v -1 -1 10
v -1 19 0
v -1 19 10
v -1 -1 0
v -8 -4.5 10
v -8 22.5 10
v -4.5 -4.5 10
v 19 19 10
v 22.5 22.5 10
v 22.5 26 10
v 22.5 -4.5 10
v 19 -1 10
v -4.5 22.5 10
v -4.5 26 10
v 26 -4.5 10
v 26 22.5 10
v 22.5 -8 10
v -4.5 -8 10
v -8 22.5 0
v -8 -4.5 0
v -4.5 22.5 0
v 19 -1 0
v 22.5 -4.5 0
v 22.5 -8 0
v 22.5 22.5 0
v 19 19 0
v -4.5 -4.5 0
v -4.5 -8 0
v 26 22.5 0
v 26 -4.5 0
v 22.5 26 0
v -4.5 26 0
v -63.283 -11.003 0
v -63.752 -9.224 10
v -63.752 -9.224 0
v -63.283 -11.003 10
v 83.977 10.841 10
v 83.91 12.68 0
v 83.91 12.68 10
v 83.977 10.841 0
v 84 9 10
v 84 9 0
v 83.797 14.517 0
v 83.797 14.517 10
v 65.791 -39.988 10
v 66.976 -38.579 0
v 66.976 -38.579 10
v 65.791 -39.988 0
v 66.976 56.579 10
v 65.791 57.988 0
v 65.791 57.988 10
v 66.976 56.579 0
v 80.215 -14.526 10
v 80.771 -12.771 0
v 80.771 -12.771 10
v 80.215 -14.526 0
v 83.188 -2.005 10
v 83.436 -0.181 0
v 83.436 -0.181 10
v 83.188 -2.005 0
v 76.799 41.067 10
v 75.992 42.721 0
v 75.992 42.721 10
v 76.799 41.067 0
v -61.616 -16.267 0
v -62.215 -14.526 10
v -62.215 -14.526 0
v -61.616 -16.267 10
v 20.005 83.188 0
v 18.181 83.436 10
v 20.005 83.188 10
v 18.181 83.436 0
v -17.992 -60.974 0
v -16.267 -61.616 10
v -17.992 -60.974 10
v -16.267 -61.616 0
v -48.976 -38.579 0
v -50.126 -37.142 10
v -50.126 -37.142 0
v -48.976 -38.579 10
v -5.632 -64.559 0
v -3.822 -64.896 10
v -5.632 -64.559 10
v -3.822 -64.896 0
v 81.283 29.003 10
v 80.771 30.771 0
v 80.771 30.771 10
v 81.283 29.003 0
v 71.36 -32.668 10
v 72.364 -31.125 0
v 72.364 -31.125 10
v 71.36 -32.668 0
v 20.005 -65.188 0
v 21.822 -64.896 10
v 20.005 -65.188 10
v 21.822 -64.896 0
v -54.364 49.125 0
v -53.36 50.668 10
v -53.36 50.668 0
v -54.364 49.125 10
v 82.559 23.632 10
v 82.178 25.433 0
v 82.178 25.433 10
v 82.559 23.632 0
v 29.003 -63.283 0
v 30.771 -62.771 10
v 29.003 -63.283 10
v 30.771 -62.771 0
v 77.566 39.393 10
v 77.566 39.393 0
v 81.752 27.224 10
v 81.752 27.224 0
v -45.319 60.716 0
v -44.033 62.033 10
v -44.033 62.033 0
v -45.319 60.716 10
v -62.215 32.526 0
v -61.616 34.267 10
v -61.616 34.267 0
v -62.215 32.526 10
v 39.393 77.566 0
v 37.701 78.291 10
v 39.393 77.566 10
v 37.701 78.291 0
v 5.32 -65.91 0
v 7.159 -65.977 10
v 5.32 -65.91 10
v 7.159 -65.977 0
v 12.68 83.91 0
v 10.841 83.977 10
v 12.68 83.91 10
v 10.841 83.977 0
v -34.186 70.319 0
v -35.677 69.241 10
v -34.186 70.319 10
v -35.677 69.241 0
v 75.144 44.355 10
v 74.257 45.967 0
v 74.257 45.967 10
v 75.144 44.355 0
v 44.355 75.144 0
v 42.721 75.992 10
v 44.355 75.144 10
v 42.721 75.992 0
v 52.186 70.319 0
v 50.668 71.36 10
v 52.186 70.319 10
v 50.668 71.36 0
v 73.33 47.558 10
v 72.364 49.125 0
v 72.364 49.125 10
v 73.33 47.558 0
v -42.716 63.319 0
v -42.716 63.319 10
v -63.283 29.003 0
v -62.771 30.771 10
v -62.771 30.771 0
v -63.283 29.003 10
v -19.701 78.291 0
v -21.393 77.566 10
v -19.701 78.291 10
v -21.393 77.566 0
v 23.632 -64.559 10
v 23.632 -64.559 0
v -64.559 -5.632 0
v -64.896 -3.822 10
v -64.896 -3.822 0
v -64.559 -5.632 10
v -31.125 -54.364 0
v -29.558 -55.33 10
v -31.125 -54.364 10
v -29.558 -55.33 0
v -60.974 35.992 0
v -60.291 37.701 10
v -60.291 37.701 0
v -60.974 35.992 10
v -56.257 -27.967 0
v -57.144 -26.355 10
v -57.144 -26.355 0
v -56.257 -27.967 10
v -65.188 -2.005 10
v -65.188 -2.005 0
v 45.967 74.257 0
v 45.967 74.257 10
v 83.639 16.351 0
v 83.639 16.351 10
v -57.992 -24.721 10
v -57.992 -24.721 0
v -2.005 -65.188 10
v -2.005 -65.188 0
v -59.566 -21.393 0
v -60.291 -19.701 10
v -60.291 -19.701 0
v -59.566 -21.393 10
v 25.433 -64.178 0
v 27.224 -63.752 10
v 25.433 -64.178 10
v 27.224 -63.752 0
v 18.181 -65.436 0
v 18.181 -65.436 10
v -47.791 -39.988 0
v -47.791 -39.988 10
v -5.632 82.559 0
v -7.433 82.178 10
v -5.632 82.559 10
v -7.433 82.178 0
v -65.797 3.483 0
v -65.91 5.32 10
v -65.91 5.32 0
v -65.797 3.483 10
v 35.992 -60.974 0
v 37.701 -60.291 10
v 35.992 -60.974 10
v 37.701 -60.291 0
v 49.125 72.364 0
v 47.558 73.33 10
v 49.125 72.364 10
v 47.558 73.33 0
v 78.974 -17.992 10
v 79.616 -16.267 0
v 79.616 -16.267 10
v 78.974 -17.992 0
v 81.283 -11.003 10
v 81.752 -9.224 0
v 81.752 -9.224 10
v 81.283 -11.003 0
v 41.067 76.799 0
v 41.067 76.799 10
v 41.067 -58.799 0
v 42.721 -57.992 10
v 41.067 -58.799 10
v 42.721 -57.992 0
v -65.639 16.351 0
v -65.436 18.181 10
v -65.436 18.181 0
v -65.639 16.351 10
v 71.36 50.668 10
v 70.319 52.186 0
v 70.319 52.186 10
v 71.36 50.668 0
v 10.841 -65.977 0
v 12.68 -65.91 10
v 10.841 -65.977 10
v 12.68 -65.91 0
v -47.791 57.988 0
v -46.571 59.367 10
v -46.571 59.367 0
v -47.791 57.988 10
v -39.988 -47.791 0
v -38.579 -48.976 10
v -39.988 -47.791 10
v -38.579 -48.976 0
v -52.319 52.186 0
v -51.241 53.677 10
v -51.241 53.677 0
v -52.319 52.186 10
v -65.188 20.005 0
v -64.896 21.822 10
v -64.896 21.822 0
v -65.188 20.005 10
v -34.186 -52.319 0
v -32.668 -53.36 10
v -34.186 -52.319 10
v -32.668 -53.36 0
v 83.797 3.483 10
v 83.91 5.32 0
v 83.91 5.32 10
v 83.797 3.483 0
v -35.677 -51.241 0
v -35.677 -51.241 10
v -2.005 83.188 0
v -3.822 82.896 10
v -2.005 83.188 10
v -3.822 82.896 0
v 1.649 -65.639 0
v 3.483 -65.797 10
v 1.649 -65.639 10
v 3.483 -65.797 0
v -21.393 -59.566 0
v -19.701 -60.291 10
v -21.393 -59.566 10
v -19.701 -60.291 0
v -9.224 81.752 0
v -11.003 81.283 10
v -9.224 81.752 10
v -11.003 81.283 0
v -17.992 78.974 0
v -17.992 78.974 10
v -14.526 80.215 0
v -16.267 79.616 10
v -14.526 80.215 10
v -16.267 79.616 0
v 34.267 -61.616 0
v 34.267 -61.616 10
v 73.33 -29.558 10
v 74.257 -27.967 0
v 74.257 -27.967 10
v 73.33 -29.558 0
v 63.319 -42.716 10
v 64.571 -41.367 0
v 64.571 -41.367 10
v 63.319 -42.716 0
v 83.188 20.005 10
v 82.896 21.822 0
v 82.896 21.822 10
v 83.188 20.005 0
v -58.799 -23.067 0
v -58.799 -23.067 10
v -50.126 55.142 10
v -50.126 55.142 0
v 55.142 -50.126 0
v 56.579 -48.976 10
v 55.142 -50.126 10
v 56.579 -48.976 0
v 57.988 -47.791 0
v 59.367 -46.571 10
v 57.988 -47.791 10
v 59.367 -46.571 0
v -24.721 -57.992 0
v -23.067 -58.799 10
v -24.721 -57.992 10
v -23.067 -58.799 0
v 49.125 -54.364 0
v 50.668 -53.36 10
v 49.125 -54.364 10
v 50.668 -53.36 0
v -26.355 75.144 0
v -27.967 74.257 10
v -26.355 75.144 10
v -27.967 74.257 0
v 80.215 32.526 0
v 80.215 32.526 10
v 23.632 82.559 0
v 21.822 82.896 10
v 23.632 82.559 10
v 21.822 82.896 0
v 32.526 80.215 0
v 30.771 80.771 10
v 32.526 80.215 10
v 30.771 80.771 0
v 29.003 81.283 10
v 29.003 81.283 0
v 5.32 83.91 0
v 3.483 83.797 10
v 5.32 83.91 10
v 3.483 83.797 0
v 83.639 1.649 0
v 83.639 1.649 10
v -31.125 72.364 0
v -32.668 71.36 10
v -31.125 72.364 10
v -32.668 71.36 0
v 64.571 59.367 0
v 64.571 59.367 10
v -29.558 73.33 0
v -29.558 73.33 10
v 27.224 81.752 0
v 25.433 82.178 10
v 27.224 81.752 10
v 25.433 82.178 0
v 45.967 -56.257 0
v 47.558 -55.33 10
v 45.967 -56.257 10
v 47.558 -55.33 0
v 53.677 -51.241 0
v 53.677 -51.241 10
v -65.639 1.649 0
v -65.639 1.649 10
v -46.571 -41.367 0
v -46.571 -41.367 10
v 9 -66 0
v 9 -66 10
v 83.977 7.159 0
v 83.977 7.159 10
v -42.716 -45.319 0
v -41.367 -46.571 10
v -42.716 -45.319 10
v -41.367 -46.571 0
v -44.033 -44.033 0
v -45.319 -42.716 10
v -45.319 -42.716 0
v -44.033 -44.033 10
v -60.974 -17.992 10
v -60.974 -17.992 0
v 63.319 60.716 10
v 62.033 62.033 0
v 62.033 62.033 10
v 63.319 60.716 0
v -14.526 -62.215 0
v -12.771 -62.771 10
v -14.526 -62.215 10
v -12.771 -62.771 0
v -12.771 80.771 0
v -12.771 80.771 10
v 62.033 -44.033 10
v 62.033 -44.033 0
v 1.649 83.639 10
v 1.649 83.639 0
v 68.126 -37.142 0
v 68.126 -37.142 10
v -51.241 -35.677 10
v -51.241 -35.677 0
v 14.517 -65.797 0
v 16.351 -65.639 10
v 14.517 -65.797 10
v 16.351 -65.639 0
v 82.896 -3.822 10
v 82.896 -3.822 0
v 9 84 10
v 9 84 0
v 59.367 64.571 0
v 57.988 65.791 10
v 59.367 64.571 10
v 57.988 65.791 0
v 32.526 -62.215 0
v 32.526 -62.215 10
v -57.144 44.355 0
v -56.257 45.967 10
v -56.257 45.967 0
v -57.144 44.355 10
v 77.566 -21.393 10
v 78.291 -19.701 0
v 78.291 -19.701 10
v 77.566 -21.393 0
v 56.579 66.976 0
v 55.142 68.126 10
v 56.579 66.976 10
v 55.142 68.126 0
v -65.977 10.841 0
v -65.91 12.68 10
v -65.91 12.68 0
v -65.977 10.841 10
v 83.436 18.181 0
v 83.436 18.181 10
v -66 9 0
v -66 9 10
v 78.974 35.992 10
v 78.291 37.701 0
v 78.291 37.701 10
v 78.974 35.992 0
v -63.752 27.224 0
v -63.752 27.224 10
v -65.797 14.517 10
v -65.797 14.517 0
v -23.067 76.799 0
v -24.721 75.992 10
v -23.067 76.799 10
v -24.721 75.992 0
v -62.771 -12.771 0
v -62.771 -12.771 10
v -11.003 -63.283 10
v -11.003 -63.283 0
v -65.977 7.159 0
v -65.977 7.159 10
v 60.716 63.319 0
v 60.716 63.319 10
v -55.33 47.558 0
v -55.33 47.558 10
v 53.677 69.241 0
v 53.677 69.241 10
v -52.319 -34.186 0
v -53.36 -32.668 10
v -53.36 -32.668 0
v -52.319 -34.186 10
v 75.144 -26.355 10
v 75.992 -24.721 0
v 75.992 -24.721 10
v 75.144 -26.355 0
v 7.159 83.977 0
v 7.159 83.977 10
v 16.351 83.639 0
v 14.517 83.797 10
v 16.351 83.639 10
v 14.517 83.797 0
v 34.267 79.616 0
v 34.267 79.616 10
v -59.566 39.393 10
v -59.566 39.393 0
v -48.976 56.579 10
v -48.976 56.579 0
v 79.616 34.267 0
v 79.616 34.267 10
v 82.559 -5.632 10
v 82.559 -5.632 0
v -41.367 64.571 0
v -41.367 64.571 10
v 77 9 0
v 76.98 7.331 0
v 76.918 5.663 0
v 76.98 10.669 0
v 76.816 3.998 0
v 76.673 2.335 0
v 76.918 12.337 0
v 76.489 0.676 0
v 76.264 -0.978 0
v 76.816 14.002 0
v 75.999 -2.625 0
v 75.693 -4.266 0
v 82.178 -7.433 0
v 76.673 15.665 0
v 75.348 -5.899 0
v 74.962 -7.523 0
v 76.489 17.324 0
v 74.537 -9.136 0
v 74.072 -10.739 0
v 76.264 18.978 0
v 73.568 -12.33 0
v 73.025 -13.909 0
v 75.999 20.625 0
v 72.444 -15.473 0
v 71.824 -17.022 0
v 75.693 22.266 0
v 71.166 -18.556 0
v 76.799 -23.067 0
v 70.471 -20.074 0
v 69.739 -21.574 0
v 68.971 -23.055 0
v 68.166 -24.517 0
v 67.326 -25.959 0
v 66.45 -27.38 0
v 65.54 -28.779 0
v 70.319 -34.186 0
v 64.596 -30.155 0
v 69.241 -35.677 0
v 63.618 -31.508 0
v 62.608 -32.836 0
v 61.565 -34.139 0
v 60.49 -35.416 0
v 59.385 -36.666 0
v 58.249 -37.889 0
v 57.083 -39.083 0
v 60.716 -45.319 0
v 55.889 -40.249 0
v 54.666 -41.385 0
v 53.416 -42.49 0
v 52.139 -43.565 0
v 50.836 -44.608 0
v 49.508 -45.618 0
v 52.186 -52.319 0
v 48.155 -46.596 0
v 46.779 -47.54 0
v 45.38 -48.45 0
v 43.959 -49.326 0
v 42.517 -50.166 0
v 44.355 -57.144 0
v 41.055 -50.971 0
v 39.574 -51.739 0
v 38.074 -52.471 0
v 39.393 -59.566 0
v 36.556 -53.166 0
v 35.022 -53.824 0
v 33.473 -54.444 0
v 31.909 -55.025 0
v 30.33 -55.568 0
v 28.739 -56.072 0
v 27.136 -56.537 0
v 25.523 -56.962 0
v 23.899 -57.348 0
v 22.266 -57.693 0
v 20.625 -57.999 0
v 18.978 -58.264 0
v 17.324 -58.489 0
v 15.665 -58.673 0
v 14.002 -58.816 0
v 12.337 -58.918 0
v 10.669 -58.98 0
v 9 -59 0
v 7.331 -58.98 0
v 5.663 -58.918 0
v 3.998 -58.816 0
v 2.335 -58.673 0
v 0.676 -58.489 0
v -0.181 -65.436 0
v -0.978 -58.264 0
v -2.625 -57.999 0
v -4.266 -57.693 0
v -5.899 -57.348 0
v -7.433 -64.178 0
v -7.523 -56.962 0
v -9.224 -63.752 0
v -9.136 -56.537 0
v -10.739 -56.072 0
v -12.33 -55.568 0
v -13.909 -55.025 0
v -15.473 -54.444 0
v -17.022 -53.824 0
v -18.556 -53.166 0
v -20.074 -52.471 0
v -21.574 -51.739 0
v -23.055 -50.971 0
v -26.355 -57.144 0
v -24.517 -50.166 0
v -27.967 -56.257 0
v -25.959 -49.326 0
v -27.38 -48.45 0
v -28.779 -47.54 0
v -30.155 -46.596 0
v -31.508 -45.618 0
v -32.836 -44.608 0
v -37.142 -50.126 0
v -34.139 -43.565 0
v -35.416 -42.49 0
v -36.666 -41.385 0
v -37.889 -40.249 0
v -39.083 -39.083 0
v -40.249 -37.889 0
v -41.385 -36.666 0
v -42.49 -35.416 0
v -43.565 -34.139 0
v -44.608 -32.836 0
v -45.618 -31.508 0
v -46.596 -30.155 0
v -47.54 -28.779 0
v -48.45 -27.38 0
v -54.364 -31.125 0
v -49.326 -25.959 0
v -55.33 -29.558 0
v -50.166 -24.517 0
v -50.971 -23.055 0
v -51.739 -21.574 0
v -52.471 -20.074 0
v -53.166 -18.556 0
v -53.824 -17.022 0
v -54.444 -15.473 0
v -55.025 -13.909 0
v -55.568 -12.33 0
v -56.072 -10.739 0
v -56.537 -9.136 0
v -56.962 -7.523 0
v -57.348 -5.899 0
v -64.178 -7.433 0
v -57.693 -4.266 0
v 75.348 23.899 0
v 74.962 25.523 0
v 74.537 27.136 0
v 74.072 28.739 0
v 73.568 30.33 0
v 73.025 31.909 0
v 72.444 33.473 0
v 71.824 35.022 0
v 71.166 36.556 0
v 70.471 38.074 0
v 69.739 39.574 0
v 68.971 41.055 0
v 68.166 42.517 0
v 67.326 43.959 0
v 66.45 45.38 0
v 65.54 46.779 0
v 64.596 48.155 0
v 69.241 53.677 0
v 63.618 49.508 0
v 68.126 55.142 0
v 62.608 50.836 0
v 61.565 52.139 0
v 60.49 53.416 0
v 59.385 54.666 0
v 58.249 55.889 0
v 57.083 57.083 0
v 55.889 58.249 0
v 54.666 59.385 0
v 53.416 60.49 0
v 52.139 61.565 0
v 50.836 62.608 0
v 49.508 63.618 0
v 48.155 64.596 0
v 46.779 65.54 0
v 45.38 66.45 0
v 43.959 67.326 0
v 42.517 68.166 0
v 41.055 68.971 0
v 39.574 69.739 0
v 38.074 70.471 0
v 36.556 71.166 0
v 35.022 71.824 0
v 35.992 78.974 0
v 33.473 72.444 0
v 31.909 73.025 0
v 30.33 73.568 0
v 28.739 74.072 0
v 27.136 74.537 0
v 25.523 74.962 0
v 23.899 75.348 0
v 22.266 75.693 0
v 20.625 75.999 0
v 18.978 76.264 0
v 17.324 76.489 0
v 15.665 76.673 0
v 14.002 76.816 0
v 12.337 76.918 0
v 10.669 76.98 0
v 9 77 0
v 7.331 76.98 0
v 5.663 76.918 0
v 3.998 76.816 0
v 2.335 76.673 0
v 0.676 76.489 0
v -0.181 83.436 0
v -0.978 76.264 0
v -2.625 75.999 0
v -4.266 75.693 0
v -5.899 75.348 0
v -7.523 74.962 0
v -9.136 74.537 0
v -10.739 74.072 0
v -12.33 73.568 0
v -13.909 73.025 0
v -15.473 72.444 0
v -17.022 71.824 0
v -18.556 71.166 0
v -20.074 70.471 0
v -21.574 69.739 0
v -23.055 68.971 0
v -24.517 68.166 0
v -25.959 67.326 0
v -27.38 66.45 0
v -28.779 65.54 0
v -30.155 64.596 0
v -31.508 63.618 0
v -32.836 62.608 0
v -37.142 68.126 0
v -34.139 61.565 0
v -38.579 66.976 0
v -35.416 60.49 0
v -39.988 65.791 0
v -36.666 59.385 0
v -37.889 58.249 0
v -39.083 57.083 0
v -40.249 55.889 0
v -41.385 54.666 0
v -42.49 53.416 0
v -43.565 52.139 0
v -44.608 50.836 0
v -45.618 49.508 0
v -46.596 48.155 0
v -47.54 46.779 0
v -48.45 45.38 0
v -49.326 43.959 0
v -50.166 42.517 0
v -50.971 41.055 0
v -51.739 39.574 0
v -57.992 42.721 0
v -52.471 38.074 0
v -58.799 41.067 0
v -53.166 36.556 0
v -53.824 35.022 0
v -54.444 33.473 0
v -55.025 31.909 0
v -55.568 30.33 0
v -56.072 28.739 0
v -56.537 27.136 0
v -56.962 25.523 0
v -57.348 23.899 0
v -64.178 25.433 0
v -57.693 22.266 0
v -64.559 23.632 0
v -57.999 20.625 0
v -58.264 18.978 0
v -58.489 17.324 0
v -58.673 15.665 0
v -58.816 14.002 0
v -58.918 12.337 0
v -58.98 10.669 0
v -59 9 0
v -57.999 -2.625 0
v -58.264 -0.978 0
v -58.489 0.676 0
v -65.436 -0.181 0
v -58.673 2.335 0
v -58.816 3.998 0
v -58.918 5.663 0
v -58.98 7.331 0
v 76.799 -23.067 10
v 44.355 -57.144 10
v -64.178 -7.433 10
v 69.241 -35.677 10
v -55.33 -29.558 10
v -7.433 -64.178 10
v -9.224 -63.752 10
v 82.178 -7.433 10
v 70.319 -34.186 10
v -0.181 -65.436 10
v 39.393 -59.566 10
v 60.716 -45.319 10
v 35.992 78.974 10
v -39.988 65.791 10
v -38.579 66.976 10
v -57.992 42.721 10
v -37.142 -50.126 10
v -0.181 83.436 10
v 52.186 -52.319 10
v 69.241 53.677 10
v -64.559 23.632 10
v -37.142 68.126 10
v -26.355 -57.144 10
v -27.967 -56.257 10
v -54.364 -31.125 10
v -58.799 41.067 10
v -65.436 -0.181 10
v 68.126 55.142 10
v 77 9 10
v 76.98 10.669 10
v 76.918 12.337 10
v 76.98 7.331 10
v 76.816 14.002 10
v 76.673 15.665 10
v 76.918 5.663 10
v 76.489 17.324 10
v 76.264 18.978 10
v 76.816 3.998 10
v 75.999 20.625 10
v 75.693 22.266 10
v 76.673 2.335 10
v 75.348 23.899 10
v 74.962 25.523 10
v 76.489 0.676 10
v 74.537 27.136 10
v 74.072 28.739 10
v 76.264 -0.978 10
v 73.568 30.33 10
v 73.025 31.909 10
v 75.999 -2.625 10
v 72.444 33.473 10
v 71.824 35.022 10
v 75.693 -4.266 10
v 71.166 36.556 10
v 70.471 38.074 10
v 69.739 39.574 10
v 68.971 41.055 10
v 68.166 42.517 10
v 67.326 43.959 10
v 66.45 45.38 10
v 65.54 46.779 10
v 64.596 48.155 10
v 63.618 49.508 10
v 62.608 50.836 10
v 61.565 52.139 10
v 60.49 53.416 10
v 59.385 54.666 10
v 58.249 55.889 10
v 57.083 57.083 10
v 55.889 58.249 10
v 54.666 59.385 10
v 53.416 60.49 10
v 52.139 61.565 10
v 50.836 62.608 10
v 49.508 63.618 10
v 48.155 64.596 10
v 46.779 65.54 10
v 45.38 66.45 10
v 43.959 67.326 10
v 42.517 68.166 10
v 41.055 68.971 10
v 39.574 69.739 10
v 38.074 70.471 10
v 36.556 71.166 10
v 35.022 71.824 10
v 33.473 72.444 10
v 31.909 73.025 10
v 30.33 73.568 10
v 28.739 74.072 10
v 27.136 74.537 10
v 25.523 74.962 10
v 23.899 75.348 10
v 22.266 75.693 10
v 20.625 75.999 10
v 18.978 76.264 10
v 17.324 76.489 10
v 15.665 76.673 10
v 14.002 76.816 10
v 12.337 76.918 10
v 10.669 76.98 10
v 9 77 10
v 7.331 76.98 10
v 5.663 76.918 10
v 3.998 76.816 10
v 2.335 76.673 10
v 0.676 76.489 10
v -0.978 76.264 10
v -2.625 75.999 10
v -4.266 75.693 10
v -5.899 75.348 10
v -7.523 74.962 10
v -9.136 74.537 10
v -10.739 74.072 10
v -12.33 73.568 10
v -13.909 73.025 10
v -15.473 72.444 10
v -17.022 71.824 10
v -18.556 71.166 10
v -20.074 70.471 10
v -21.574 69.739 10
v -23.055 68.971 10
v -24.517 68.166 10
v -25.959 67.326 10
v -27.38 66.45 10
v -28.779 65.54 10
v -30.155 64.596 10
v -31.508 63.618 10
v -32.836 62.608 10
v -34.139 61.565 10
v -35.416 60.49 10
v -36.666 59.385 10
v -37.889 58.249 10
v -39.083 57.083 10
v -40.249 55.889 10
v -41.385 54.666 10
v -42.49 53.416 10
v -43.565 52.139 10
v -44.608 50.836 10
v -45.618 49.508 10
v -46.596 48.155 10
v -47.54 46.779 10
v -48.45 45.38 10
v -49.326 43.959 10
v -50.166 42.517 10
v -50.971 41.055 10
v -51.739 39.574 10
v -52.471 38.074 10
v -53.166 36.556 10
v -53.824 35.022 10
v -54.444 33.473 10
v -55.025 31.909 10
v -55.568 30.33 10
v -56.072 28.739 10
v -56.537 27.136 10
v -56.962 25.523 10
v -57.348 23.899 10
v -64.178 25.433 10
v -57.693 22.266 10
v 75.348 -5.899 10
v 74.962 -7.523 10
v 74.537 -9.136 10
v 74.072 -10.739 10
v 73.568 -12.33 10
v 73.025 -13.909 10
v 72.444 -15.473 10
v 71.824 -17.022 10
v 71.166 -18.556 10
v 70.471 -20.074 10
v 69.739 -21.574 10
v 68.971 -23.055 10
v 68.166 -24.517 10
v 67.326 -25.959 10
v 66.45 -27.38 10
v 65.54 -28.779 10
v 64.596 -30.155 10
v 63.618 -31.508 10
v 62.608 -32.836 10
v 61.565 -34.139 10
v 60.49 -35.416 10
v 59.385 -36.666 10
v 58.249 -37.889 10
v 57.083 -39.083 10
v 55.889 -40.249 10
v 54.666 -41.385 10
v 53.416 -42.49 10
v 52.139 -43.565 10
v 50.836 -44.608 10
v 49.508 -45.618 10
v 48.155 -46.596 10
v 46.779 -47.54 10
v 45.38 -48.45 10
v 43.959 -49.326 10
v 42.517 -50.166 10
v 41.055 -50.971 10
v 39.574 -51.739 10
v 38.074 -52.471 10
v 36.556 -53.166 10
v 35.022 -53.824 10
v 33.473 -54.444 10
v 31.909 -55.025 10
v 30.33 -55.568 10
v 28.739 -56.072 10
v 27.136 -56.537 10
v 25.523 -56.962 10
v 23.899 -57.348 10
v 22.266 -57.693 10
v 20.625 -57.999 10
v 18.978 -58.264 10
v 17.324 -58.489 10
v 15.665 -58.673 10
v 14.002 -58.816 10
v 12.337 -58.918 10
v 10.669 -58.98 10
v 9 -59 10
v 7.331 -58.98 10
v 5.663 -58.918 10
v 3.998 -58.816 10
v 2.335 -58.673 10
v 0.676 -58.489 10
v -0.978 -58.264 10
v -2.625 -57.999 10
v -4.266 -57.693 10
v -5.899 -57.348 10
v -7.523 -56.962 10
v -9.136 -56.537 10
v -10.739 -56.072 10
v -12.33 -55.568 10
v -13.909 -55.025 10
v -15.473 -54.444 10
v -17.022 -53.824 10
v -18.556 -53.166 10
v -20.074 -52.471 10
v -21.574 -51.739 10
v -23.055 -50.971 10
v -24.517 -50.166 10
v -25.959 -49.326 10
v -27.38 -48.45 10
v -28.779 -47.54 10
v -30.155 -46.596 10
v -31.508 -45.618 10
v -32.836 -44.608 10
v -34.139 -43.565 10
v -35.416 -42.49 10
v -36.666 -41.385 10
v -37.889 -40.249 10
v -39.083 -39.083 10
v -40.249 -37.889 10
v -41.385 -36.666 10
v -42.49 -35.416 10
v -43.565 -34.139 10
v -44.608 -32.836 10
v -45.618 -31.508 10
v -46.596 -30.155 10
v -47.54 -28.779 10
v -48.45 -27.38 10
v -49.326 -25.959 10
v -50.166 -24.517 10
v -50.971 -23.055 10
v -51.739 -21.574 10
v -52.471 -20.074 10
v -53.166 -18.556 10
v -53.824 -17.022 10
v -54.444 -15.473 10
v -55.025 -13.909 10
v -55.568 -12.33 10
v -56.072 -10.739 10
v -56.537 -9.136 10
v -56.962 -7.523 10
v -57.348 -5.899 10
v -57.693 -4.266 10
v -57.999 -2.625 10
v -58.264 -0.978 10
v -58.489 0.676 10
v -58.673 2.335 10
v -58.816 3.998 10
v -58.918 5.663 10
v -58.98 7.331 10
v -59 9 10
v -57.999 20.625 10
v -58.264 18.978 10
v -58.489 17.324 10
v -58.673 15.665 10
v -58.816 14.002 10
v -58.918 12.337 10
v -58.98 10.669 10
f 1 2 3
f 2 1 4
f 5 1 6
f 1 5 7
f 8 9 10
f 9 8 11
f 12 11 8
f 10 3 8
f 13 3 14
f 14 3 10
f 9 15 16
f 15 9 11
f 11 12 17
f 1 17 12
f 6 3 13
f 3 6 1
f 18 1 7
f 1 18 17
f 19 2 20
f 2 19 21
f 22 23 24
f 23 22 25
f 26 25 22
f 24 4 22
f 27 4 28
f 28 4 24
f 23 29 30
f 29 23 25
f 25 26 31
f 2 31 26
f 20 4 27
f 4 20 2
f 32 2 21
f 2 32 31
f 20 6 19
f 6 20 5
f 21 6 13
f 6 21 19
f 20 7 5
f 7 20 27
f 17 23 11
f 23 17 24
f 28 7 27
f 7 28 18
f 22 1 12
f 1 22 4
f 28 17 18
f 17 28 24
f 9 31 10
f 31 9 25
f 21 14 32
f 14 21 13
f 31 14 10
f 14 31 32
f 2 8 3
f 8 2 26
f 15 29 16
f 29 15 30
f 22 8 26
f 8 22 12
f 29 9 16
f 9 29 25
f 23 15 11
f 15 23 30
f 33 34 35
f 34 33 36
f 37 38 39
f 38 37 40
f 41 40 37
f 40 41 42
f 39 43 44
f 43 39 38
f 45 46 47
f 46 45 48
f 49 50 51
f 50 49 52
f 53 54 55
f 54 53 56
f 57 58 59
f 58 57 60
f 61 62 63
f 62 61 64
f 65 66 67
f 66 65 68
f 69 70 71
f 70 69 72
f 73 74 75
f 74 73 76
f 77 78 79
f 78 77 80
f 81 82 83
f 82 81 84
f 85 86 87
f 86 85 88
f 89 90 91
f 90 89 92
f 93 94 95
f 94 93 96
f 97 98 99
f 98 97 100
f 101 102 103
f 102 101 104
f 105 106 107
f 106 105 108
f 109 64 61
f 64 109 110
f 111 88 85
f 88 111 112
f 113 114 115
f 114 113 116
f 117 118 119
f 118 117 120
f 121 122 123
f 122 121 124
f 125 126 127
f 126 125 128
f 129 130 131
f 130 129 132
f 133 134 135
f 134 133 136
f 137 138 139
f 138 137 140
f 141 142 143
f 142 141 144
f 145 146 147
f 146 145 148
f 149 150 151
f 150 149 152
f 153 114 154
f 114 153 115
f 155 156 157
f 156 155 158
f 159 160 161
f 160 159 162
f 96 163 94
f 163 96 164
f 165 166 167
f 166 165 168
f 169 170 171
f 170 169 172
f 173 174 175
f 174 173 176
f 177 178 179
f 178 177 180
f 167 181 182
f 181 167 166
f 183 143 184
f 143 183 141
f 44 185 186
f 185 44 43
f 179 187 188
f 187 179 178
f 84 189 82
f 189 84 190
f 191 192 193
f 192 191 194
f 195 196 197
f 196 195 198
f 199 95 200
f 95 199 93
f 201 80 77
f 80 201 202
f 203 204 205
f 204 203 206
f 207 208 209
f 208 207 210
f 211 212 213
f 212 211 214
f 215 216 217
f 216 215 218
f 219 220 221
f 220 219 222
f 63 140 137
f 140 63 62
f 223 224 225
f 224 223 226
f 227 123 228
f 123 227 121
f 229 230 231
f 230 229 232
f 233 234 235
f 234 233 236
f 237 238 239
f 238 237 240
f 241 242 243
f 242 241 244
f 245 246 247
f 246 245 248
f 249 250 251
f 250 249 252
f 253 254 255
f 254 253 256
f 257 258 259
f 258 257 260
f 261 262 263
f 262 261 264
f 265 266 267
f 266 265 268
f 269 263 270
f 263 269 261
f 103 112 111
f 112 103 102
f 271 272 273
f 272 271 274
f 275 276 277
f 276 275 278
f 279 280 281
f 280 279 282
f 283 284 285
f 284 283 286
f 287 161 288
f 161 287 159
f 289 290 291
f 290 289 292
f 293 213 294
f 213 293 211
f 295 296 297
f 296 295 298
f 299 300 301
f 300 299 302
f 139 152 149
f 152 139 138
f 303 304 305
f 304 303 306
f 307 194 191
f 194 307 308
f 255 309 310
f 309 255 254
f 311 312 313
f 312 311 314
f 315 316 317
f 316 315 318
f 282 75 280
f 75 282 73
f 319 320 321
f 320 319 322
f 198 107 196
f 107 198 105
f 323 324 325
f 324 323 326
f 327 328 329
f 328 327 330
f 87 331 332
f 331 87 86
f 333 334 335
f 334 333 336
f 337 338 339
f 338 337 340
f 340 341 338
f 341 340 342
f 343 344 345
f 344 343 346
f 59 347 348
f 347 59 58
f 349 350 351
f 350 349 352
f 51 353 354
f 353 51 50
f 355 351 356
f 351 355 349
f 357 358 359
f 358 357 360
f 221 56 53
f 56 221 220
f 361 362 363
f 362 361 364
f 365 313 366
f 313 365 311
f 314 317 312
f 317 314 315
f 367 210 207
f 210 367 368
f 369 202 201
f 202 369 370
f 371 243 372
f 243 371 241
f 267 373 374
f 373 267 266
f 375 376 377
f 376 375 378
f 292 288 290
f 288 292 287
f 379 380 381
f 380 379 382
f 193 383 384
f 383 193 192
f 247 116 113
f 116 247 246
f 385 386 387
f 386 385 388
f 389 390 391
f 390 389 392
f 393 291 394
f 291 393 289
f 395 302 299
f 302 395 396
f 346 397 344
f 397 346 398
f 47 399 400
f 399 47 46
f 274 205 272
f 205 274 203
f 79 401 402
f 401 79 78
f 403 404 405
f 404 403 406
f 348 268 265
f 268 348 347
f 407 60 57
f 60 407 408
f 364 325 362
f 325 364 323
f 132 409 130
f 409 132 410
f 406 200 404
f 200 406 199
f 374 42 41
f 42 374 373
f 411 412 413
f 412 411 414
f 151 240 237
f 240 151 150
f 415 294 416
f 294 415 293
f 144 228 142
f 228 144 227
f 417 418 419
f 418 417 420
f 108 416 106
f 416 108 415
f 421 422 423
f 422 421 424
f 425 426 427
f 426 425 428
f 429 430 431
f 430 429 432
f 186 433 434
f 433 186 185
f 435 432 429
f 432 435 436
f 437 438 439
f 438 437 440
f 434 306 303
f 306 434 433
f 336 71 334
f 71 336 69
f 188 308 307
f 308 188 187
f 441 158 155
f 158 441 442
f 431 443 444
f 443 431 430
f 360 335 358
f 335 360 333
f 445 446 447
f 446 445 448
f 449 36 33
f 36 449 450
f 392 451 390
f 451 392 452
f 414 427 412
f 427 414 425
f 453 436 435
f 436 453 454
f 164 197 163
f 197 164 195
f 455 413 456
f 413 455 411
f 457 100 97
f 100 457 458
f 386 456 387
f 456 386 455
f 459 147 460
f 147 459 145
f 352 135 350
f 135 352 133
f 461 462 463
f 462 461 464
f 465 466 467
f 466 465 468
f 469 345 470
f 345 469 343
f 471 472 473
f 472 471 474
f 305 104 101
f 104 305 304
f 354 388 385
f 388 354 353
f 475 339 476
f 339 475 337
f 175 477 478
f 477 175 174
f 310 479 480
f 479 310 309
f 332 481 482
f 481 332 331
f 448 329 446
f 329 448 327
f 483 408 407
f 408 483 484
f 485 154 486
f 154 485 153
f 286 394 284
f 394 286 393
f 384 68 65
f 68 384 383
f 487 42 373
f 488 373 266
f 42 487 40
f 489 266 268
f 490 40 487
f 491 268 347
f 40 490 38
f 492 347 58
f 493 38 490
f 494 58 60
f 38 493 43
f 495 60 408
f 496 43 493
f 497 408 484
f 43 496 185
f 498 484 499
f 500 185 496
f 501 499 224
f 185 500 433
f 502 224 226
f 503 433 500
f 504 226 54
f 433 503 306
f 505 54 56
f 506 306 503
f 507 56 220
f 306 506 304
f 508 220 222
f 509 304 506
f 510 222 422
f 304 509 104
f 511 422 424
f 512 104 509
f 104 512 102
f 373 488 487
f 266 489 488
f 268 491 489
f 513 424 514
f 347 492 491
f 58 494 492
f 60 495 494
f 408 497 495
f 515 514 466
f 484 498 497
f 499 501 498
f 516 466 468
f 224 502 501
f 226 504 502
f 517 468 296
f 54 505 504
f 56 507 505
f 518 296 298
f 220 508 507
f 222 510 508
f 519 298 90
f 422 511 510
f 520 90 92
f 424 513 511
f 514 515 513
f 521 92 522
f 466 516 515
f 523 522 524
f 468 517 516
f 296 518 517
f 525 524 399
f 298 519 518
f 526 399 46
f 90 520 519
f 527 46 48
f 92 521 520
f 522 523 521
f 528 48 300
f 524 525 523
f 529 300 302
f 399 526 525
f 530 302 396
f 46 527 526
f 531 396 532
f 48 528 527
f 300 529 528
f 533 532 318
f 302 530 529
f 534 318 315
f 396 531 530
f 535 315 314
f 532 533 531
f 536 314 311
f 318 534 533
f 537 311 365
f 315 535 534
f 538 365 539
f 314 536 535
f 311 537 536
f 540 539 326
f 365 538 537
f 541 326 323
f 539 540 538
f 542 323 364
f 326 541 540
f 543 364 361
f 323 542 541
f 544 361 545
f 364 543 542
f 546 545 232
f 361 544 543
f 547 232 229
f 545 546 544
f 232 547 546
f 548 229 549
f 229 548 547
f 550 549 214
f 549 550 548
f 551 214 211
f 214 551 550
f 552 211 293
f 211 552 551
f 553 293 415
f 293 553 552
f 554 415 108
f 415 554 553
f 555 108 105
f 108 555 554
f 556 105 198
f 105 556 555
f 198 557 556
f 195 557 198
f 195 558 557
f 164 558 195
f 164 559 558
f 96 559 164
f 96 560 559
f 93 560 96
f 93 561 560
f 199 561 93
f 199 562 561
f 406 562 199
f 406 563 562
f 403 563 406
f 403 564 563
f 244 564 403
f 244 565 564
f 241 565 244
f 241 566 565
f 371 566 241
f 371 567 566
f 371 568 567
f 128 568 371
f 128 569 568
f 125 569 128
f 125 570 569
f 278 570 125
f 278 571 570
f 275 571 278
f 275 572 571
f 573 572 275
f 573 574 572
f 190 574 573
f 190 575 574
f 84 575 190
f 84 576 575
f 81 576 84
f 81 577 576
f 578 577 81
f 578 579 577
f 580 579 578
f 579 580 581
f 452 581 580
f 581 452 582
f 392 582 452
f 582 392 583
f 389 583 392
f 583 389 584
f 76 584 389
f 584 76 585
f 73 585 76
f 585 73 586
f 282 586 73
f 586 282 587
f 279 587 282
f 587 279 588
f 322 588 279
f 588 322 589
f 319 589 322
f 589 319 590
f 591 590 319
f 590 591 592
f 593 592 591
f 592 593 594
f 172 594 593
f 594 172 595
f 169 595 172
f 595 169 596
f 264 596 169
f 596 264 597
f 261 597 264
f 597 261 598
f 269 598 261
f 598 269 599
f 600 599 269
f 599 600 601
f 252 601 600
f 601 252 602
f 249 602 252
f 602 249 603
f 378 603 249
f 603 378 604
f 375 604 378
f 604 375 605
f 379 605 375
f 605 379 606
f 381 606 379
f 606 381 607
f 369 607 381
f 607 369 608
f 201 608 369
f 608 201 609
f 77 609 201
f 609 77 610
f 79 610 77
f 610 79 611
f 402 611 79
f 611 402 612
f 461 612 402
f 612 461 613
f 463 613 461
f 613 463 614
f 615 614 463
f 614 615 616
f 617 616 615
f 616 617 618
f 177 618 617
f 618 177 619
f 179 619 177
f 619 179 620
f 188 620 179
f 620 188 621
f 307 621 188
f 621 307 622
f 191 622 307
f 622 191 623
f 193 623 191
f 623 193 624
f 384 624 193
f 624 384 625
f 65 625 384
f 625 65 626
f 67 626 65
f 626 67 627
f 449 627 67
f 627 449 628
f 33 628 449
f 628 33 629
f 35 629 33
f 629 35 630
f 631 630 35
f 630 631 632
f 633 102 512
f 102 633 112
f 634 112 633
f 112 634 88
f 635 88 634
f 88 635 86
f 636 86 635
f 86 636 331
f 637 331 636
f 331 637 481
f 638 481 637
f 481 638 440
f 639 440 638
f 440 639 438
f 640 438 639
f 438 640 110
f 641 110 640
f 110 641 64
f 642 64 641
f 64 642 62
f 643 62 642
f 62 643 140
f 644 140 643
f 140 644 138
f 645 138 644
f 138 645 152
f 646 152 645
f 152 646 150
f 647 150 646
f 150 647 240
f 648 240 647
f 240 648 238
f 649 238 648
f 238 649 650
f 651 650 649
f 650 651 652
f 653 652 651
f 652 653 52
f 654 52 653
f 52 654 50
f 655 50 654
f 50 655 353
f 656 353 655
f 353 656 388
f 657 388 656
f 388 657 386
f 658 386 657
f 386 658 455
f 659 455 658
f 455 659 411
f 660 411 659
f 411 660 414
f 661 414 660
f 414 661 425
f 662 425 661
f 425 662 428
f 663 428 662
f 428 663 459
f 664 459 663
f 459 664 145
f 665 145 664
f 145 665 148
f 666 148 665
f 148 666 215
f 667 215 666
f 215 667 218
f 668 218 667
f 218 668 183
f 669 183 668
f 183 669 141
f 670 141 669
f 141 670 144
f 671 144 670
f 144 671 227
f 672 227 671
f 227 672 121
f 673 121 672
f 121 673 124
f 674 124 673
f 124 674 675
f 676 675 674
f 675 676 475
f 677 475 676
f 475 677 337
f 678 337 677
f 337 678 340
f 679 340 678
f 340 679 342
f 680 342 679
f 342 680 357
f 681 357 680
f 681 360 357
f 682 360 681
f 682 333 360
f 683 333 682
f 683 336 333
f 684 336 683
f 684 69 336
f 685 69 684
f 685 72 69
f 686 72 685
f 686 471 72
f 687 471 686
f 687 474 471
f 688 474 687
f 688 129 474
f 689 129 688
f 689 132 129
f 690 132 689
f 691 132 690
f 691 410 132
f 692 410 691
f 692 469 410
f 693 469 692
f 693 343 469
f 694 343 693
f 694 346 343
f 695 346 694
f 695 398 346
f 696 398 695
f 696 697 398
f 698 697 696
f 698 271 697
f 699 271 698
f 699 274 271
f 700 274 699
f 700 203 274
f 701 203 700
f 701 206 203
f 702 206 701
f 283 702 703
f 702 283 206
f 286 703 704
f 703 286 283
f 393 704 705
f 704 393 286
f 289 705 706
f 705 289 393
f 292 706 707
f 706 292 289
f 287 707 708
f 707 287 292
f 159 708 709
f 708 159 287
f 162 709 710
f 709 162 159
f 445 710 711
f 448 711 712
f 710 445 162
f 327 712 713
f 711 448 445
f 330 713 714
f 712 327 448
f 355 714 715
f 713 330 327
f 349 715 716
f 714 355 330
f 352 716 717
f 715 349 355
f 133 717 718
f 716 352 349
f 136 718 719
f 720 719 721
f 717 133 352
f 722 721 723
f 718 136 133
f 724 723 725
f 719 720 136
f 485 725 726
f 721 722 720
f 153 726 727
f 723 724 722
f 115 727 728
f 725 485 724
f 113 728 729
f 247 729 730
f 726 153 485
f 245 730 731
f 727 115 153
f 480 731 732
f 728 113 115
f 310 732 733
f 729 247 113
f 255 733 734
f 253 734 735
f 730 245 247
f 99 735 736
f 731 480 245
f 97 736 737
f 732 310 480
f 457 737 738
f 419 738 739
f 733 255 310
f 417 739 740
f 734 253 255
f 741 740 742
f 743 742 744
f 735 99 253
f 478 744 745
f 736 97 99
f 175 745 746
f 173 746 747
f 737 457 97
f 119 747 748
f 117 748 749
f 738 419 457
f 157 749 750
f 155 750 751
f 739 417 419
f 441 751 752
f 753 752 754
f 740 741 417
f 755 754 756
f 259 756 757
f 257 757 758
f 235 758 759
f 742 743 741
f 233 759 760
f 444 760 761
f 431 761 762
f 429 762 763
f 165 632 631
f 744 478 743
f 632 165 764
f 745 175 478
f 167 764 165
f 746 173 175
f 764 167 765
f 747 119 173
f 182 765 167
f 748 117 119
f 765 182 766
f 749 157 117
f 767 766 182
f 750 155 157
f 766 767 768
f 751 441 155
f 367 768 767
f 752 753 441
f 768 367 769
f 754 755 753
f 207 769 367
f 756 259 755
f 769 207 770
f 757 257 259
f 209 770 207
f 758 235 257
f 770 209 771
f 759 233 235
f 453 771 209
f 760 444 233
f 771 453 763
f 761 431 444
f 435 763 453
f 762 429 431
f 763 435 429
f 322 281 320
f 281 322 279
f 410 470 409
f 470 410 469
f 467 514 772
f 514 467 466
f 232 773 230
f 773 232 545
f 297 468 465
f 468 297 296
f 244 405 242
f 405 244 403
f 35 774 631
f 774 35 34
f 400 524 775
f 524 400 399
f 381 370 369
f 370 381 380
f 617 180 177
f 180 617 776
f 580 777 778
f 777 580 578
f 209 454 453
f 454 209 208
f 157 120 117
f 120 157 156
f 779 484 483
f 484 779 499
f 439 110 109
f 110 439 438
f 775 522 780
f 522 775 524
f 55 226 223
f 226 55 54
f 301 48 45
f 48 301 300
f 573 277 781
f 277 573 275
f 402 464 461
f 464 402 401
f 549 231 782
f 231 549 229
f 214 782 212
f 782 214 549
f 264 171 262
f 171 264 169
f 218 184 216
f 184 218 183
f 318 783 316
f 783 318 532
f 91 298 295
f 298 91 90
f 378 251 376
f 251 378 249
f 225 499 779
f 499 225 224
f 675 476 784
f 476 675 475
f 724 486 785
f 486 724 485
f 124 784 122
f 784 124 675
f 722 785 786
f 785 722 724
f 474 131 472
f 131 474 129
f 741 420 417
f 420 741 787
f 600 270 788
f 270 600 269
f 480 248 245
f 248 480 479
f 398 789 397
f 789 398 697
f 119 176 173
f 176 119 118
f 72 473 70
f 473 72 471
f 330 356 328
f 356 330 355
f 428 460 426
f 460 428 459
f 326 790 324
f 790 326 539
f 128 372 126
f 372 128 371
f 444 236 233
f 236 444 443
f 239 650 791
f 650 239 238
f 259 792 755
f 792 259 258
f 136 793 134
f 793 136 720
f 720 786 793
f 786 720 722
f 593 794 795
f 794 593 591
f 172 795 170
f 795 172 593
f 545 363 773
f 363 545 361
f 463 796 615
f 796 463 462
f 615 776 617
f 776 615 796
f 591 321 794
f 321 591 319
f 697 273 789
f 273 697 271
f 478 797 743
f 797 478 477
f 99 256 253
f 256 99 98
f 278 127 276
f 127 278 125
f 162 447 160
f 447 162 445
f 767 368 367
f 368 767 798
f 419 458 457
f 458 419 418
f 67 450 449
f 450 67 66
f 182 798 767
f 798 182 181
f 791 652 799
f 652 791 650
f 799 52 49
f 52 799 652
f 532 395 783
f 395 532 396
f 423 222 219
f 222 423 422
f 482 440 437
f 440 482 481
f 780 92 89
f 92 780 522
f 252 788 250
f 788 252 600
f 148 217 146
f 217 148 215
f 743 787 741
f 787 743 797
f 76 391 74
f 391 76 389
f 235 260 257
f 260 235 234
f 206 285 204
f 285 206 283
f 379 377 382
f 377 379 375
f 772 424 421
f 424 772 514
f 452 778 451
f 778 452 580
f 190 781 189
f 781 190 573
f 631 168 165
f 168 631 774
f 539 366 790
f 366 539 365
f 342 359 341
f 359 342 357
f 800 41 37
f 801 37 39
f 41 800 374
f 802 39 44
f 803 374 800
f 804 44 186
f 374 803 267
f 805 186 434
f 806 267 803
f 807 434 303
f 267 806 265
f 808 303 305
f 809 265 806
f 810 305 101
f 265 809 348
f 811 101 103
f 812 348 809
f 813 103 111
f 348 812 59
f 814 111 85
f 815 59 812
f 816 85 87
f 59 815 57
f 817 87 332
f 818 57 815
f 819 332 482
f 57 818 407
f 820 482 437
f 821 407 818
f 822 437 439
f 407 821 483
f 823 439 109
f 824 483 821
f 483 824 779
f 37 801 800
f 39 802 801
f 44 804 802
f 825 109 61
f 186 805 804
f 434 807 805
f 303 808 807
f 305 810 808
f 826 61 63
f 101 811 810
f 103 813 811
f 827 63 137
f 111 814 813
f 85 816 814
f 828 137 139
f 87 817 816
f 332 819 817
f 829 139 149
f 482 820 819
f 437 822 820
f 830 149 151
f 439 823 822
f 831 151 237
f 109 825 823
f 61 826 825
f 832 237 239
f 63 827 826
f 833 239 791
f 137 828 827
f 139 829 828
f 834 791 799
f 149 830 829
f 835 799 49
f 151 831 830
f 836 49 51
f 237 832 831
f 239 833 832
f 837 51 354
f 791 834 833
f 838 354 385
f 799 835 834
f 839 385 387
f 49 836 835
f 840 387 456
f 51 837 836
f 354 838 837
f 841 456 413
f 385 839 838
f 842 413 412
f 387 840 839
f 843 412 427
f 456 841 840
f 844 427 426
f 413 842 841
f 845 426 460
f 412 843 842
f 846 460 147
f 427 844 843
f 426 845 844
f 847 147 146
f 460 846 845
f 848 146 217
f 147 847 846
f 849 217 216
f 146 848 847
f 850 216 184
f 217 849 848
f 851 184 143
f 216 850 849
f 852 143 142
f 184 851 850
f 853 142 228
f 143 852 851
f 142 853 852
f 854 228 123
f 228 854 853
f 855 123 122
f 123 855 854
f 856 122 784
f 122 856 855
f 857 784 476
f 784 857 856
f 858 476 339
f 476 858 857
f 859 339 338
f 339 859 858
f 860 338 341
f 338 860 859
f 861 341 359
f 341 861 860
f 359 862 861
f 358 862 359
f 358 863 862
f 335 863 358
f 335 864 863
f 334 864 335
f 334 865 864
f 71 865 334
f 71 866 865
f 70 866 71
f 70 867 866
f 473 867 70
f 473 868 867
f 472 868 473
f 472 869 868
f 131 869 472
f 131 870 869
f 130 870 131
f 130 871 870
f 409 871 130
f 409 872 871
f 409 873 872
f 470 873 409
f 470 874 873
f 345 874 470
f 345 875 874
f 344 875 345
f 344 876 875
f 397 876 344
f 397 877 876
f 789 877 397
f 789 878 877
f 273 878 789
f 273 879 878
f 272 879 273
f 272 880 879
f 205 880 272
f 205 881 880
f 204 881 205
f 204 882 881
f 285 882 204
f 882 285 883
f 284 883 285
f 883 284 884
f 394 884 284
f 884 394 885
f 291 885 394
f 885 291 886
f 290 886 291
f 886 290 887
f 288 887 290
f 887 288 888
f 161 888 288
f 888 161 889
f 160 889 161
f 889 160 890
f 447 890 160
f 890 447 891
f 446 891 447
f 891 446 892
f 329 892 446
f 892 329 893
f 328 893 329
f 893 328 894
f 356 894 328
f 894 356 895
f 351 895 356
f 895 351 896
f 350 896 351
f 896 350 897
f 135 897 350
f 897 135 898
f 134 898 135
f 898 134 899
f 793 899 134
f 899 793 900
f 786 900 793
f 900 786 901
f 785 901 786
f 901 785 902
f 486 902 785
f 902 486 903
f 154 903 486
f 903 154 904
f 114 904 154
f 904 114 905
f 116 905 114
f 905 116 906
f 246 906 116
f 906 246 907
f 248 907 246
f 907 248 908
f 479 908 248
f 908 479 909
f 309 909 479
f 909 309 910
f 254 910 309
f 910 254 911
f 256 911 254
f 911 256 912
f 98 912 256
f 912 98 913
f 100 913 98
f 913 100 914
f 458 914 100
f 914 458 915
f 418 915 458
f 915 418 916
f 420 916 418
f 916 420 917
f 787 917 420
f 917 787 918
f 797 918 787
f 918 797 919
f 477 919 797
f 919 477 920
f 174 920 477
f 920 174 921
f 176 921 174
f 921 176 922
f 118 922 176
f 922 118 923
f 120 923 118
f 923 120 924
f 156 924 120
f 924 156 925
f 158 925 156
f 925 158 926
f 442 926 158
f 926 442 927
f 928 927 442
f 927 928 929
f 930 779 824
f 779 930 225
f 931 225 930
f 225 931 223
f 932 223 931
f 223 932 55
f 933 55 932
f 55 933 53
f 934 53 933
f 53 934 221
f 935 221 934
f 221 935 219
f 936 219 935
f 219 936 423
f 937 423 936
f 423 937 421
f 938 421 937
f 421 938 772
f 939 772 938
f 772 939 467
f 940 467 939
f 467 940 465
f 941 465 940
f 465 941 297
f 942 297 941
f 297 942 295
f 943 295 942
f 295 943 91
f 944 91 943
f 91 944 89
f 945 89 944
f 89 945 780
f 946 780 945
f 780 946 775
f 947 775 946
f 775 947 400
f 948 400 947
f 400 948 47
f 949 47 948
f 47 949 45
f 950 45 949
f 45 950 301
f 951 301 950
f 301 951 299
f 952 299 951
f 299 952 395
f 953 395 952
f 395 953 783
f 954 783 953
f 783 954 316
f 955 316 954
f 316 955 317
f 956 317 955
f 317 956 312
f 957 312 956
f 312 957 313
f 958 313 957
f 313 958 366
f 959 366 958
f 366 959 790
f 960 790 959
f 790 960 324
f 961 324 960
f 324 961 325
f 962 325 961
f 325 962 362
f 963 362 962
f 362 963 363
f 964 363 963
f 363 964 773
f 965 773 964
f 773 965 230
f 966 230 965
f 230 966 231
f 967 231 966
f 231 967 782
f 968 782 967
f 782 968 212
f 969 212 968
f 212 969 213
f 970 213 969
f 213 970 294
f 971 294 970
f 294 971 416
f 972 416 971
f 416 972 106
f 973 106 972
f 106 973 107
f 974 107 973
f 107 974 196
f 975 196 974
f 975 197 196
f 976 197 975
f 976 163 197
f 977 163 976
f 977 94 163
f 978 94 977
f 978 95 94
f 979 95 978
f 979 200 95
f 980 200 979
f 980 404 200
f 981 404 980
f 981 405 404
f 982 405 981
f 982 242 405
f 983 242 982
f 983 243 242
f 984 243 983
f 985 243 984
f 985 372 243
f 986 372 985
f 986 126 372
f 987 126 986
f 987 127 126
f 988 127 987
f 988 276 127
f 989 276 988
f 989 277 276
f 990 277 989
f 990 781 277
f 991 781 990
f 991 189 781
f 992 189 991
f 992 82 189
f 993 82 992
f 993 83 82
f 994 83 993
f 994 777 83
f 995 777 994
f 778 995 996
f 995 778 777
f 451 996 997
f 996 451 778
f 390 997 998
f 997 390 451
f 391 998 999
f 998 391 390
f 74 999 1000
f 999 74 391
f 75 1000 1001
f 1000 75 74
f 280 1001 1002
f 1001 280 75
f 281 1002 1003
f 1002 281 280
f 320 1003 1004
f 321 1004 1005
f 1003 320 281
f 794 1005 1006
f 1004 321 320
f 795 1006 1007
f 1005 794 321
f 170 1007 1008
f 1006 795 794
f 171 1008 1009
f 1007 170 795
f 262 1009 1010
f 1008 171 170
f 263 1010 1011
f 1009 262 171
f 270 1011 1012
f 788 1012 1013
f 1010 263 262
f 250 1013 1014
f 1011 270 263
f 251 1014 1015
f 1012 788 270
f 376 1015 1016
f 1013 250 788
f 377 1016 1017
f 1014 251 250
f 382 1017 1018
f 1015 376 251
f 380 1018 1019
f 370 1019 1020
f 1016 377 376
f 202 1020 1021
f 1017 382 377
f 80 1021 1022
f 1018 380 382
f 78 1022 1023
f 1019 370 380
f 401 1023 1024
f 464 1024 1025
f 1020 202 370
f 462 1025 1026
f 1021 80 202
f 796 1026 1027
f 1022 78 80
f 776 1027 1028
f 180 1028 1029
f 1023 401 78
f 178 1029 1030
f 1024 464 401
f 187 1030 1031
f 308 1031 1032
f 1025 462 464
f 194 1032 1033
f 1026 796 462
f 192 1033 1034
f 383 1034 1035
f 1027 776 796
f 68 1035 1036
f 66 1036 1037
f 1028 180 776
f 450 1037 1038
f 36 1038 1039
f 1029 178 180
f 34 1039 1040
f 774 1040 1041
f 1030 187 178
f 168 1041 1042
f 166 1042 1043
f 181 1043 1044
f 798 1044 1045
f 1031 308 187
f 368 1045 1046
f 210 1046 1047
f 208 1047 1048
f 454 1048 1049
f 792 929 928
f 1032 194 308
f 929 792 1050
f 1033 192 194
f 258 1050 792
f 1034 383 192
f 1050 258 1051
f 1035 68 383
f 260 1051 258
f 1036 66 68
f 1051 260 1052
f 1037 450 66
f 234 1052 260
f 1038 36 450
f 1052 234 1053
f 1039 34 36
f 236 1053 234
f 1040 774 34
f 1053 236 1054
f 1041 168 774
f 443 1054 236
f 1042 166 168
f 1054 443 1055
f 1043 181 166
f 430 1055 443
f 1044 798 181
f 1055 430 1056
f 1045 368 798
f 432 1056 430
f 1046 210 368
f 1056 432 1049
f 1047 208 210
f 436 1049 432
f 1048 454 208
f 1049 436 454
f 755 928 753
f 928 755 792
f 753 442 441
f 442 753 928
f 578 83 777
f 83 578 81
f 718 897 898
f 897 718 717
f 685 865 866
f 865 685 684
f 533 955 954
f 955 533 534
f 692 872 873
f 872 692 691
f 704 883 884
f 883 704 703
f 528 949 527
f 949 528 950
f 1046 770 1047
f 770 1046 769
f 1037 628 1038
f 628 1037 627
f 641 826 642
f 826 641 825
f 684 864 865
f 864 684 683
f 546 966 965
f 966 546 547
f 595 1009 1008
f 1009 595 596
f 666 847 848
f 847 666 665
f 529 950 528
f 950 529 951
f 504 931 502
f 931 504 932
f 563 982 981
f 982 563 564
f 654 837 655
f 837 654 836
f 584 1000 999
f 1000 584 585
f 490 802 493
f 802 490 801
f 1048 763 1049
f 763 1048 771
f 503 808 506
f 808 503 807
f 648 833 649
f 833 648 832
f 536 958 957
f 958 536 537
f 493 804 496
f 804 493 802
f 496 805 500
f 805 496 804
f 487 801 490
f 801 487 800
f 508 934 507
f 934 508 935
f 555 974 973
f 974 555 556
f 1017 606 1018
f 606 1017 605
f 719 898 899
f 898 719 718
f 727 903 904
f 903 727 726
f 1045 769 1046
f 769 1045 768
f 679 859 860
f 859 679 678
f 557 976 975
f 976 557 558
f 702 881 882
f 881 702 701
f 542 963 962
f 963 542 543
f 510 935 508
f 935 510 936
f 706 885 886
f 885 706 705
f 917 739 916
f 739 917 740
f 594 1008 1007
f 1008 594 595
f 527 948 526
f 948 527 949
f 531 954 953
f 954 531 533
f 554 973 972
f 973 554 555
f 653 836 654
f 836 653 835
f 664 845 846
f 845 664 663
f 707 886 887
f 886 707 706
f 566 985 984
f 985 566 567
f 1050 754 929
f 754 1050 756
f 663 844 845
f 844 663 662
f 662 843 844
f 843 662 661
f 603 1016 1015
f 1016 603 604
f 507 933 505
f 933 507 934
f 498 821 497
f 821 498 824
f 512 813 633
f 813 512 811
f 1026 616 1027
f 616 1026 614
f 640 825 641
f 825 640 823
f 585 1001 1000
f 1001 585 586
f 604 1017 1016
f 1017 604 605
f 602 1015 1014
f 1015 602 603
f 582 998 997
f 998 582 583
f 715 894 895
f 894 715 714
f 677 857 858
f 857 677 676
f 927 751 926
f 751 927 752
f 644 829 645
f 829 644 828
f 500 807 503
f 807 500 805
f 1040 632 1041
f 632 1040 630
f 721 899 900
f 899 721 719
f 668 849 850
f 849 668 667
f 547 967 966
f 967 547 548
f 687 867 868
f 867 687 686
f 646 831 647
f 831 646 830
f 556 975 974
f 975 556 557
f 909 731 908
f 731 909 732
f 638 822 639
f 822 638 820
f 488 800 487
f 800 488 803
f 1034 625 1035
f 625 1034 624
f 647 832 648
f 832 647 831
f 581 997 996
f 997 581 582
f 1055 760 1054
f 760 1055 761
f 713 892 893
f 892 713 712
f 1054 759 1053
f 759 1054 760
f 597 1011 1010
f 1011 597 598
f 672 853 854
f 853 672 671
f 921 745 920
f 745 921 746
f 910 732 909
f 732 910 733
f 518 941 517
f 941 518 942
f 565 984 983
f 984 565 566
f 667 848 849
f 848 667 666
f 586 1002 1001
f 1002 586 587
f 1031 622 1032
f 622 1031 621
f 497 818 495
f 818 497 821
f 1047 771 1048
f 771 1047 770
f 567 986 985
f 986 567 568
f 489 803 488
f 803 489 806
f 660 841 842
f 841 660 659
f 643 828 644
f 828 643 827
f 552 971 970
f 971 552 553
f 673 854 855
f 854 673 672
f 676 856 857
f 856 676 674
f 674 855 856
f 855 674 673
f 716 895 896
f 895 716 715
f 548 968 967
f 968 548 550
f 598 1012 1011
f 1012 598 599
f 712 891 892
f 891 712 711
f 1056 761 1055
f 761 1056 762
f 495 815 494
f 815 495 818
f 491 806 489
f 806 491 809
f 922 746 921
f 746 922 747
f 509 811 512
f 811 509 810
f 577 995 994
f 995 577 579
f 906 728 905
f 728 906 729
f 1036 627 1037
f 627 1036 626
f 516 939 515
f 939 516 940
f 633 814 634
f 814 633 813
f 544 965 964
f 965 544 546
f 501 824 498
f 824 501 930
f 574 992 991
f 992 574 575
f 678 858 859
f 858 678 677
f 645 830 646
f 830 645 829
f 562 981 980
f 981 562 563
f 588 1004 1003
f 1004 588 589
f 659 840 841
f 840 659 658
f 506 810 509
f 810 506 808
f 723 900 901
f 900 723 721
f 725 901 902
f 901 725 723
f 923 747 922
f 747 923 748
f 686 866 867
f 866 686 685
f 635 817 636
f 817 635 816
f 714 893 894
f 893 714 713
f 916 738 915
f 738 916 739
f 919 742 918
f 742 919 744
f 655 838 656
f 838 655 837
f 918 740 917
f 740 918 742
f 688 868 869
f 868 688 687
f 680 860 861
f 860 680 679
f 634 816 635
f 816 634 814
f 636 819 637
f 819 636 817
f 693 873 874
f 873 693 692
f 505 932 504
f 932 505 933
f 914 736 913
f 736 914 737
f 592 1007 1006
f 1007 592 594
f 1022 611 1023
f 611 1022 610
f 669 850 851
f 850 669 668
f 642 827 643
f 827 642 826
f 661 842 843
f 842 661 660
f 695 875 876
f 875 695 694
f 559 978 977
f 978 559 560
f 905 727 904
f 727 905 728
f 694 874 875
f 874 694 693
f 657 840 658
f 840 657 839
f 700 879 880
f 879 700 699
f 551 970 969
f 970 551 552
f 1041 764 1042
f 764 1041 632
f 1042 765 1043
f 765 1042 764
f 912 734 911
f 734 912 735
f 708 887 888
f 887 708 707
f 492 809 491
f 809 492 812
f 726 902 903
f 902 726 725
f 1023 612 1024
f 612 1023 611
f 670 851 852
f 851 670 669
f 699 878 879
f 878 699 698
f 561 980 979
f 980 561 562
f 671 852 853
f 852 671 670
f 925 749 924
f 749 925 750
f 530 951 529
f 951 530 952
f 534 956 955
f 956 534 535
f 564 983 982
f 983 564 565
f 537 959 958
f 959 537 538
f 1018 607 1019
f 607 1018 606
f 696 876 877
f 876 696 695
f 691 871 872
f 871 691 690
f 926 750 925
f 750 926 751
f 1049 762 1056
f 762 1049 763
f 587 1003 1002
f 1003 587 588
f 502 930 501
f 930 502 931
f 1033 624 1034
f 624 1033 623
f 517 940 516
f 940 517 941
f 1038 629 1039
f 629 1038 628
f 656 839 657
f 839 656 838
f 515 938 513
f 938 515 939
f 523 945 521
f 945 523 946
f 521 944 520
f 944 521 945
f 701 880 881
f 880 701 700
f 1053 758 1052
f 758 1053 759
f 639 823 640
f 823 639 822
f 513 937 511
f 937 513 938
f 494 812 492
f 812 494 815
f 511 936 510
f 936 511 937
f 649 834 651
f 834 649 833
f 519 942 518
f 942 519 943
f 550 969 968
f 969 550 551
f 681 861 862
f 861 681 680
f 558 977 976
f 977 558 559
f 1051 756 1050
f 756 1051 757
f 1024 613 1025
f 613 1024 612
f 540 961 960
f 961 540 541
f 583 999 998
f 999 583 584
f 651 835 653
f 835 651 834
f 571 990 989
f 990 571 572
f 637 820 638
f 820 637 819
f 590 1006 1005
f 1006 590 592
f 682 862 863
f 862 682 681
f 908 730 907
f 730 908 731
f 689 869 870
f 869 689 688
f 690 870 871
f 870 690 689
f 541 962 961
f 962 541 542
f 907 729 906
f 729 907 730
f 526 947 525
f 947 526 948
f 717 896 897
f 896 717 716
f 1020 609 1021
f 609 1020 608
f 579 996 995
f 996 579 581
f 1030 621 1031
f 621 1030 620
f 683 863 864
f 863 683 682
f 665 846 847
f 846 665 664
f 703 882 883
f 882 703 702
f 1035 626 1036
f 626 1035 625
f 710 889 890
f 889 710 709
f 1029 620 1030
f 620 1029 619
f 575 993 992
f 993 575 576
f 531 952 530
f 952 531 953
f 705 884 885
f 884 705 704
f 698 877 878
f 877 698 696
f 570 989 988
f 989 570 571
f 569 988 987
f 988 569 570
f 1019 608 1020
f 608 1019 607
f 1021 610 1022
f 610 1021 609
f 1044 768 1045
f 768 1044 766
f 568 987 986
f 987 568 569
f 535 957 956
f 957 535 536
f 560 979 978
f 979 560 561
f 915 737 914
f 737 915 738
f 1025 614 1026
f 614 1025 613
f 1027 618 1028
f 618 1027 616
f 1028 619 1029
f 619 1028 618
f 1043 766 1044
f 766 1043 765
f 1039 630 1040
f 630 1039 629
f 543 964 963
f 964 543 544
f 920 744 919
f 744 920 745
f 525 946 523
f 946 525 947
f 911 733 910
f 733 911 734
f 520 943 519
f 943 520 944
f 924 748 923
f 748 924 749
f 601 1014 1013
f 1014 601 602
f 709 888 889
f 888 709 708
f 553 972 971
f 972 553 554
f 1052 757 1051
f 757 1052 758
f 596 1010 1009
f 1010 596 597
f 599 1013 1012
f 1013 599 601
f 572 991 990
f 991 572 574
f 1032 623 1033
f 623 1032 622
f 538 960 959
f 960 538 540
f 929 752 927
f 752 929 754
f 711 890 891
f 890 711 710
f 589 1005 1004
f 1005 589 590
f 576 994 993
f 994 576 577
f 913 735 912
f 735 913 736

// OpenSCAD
// Generated by SolidPython 1.1.3 on 2026-06-23 12:55:20


union() {
	union() {
		translate(v = [-4.5000000000, 9.0000000000, 5.0000000000]) {
			cube(center = true, size = [7, 27, 10]);
		}
		translate(v = [9.0000000000, -4.5000000000, 5.0000000000]) {
			cube(center = true, size = [27, 7, 10]);
		}
		translate(v = [0, 27]) {
			translate(v = [9.0000000000, -4.5000000000, 5.0000000000]) {
				cube(center = true, size = [27, 7, 10]);
			}
		}
		translate(v = [27, 0]) {
			translate(v = [-4.5000000000, 9.0000000000, 5.0000000000]) {
				cube(center = true, size = [7, 27, 10]);
			}
		}
	}
	translate(v = [9.0000000000, 9.0000000000]) {
		difference() {
			cylinder($fn = 256, h = 10, r = 75.0000000000);
			cylinder($fn = 256, h = 10, r = 68.0000000000);
		}
	}
}
/***********************************************
*********      SolidPython code:      **********
************************************************

"""SCAD file export functions.

This module provides functions for exporting OpenSCAD geometries to .scad files.
"""

from typing import Dict, Optional
from pathlib import Path
import solid

from .config import ExportConfiguration, FileNamingConfig


def export_scad(
    geometry: solid.OpenSCADObject, output_path: Path, header: Optional[str] = None
) -> Path:
    """Export geometry to SCAD file.

    Parameters
    ----------
    geometry : solid.OpenSCADObject
        Geometry to export.
    output_path : Path
        Output file path.
    header : str, optional
        Header comment to add to SCAD file.

    Returns
    -------
    Path
        Path to created SCAD file.

    Raises
    ------
    IOError
        If file cannot be written.

    Examples
    --------
    >>> from pathlib import Path
    >>> import solid
    >>>
    >>> geometry = solid.cube([10, 10, 10])
    >>> output_path = Path('output/device.scad')
    >>> export_scad(geometry, output_path)
    """
    # Ensure parent directory exists
    output_path.parent.mkdir(parents=True, exist_ok=True)

    # Render to file
    try:
        solid.scad_render_to_file(geometry, str(output_path))
    except Exception as e:
        raise IOError(f"Failed to write SCAD file to {output_path}: {e}")

    _normalize_scad_file(output_path)

    # Add header if provided
    if header:
        _add_header_to_scad(output_path, header)
        _normalize_scad_file(output_path)

    return output_path


def _normalize_scad_file(scad_path: Path) -> None:
    """Strip trailing whitespace from generated SCAD text."""
    content = scad_path.read_text()
    normalized = "\n".join(line.rstrip() for line in content.splitlines()) + "\n"
    if normalized != content:
        scad_path.write_text(normalized)


def export_multiple_scad(
    geometries: Dict[str, solid.OpenSCADObject],
    config: ExportConfiguration,
    naming_config: Optional[FileNamingConfig] = None,
) -> Dict[str, Path]:
    """Export multiple geometries to SCAD files.

    Parameters
    ----------
    geometries : dict
        Dictionary mapping prefixes to geometries.
        Keys are used as filename prefixes.
    config : ExportConfiguration
        Export configuration.
    naming_config : FileNamingConfig, optional
        File naming configuration.

    Returns
    -------
    dict
        Dictionary mapping prefixes to output paths.

    Examples
    --------
    >>> geometries = {
    ...     'wells': wells_geometry,
    ...     'channels': channels_geometry,
    ...     'device': device_geometry
    ... }
    >>> config = ExportConfiguration(output_directory=Path('output'))
    >>> paths = export_multiple_scad(geometries, config)
    """
    output_paths = {}

    for prefix, geometry in geometries.items():
        # Create naming config for this geometry
        if naming_config:
            file_config = FileNamingConfig(
                prefix=prefix,
                version=naming_config.version,
                grid_size=naming_config.grid_size,
                suffix=naming_config.suffix,
            )
        else:
            file_config = FileNamingConfig(prefix=prefix)

        # Generate filename
        filename = file_config.generate_filename("scad")
        output_path = config.get_output_path(filename)

        # Export
        export_scad(geometry, output_path)
        output_paths[prefix] = output_path

    return output_paths


def _add_header_to_scad(scad_path: Path, header: str):
    """Add header comment to existing SCAD file.

    Parameters
    ----------
    scad_path : Path
        Path to SCAD file.
    header : str
        Header text to add.
    """
    # Read existing content
    with open(scad_path, "r") as f:
        content = f.read()

    # Prepend header
    header_comment = f"// {header}\n\n"
    with open(scad_path, "w") as f:
        f.write(header_comment + content)


def generate_scad_header(
    device_name: str, version: Optional[str] = None, description: Optional[str] = None
) -> str:
    """Generate SCAD file header comment.

    Parameters
    ----------
    device_name : str
        Device name.
    version : str, optional
        Version string.
    description : str, optional
        Device description.

    Returns
    -------
    str
        Header comment text.

    Examples
    --------
    >>> header = generate_scad_header(
    ...     'Two Compartment Device',
    ...     version='v1',
    ...     description='96-well format with microchannels'
    ... )
    """
    lines = []
    lines.append("=" * 60)
    lines.append(f"Device: {device_name}")

    if version:
        lines.append(f"Version: {version}")

    if description:
        lines.append(f"Description: {description}")

    lines.append("Generated by OpenMFD")
    lines.append("=" * 60)

    return "\n".join(lines)


def validate_scad_file(scad_path: Path) -> bool:
    """Validate that SCAD file exists and is readable.

    Parameters
    ----------
    scad_path : Path
        Path to SCAD file.

    Returns
    -------
    bool
        True if file is valid, False otherwise.
    """
    if not scad_path.exists():
        return False

    if not scad_path.is_file():
        return False

    # Try to read file
    try:
        with open(scad_path, "r") as f:
            content = f.read()
        return len(content) > 0
    except Exception:
        return False


************************************************/
